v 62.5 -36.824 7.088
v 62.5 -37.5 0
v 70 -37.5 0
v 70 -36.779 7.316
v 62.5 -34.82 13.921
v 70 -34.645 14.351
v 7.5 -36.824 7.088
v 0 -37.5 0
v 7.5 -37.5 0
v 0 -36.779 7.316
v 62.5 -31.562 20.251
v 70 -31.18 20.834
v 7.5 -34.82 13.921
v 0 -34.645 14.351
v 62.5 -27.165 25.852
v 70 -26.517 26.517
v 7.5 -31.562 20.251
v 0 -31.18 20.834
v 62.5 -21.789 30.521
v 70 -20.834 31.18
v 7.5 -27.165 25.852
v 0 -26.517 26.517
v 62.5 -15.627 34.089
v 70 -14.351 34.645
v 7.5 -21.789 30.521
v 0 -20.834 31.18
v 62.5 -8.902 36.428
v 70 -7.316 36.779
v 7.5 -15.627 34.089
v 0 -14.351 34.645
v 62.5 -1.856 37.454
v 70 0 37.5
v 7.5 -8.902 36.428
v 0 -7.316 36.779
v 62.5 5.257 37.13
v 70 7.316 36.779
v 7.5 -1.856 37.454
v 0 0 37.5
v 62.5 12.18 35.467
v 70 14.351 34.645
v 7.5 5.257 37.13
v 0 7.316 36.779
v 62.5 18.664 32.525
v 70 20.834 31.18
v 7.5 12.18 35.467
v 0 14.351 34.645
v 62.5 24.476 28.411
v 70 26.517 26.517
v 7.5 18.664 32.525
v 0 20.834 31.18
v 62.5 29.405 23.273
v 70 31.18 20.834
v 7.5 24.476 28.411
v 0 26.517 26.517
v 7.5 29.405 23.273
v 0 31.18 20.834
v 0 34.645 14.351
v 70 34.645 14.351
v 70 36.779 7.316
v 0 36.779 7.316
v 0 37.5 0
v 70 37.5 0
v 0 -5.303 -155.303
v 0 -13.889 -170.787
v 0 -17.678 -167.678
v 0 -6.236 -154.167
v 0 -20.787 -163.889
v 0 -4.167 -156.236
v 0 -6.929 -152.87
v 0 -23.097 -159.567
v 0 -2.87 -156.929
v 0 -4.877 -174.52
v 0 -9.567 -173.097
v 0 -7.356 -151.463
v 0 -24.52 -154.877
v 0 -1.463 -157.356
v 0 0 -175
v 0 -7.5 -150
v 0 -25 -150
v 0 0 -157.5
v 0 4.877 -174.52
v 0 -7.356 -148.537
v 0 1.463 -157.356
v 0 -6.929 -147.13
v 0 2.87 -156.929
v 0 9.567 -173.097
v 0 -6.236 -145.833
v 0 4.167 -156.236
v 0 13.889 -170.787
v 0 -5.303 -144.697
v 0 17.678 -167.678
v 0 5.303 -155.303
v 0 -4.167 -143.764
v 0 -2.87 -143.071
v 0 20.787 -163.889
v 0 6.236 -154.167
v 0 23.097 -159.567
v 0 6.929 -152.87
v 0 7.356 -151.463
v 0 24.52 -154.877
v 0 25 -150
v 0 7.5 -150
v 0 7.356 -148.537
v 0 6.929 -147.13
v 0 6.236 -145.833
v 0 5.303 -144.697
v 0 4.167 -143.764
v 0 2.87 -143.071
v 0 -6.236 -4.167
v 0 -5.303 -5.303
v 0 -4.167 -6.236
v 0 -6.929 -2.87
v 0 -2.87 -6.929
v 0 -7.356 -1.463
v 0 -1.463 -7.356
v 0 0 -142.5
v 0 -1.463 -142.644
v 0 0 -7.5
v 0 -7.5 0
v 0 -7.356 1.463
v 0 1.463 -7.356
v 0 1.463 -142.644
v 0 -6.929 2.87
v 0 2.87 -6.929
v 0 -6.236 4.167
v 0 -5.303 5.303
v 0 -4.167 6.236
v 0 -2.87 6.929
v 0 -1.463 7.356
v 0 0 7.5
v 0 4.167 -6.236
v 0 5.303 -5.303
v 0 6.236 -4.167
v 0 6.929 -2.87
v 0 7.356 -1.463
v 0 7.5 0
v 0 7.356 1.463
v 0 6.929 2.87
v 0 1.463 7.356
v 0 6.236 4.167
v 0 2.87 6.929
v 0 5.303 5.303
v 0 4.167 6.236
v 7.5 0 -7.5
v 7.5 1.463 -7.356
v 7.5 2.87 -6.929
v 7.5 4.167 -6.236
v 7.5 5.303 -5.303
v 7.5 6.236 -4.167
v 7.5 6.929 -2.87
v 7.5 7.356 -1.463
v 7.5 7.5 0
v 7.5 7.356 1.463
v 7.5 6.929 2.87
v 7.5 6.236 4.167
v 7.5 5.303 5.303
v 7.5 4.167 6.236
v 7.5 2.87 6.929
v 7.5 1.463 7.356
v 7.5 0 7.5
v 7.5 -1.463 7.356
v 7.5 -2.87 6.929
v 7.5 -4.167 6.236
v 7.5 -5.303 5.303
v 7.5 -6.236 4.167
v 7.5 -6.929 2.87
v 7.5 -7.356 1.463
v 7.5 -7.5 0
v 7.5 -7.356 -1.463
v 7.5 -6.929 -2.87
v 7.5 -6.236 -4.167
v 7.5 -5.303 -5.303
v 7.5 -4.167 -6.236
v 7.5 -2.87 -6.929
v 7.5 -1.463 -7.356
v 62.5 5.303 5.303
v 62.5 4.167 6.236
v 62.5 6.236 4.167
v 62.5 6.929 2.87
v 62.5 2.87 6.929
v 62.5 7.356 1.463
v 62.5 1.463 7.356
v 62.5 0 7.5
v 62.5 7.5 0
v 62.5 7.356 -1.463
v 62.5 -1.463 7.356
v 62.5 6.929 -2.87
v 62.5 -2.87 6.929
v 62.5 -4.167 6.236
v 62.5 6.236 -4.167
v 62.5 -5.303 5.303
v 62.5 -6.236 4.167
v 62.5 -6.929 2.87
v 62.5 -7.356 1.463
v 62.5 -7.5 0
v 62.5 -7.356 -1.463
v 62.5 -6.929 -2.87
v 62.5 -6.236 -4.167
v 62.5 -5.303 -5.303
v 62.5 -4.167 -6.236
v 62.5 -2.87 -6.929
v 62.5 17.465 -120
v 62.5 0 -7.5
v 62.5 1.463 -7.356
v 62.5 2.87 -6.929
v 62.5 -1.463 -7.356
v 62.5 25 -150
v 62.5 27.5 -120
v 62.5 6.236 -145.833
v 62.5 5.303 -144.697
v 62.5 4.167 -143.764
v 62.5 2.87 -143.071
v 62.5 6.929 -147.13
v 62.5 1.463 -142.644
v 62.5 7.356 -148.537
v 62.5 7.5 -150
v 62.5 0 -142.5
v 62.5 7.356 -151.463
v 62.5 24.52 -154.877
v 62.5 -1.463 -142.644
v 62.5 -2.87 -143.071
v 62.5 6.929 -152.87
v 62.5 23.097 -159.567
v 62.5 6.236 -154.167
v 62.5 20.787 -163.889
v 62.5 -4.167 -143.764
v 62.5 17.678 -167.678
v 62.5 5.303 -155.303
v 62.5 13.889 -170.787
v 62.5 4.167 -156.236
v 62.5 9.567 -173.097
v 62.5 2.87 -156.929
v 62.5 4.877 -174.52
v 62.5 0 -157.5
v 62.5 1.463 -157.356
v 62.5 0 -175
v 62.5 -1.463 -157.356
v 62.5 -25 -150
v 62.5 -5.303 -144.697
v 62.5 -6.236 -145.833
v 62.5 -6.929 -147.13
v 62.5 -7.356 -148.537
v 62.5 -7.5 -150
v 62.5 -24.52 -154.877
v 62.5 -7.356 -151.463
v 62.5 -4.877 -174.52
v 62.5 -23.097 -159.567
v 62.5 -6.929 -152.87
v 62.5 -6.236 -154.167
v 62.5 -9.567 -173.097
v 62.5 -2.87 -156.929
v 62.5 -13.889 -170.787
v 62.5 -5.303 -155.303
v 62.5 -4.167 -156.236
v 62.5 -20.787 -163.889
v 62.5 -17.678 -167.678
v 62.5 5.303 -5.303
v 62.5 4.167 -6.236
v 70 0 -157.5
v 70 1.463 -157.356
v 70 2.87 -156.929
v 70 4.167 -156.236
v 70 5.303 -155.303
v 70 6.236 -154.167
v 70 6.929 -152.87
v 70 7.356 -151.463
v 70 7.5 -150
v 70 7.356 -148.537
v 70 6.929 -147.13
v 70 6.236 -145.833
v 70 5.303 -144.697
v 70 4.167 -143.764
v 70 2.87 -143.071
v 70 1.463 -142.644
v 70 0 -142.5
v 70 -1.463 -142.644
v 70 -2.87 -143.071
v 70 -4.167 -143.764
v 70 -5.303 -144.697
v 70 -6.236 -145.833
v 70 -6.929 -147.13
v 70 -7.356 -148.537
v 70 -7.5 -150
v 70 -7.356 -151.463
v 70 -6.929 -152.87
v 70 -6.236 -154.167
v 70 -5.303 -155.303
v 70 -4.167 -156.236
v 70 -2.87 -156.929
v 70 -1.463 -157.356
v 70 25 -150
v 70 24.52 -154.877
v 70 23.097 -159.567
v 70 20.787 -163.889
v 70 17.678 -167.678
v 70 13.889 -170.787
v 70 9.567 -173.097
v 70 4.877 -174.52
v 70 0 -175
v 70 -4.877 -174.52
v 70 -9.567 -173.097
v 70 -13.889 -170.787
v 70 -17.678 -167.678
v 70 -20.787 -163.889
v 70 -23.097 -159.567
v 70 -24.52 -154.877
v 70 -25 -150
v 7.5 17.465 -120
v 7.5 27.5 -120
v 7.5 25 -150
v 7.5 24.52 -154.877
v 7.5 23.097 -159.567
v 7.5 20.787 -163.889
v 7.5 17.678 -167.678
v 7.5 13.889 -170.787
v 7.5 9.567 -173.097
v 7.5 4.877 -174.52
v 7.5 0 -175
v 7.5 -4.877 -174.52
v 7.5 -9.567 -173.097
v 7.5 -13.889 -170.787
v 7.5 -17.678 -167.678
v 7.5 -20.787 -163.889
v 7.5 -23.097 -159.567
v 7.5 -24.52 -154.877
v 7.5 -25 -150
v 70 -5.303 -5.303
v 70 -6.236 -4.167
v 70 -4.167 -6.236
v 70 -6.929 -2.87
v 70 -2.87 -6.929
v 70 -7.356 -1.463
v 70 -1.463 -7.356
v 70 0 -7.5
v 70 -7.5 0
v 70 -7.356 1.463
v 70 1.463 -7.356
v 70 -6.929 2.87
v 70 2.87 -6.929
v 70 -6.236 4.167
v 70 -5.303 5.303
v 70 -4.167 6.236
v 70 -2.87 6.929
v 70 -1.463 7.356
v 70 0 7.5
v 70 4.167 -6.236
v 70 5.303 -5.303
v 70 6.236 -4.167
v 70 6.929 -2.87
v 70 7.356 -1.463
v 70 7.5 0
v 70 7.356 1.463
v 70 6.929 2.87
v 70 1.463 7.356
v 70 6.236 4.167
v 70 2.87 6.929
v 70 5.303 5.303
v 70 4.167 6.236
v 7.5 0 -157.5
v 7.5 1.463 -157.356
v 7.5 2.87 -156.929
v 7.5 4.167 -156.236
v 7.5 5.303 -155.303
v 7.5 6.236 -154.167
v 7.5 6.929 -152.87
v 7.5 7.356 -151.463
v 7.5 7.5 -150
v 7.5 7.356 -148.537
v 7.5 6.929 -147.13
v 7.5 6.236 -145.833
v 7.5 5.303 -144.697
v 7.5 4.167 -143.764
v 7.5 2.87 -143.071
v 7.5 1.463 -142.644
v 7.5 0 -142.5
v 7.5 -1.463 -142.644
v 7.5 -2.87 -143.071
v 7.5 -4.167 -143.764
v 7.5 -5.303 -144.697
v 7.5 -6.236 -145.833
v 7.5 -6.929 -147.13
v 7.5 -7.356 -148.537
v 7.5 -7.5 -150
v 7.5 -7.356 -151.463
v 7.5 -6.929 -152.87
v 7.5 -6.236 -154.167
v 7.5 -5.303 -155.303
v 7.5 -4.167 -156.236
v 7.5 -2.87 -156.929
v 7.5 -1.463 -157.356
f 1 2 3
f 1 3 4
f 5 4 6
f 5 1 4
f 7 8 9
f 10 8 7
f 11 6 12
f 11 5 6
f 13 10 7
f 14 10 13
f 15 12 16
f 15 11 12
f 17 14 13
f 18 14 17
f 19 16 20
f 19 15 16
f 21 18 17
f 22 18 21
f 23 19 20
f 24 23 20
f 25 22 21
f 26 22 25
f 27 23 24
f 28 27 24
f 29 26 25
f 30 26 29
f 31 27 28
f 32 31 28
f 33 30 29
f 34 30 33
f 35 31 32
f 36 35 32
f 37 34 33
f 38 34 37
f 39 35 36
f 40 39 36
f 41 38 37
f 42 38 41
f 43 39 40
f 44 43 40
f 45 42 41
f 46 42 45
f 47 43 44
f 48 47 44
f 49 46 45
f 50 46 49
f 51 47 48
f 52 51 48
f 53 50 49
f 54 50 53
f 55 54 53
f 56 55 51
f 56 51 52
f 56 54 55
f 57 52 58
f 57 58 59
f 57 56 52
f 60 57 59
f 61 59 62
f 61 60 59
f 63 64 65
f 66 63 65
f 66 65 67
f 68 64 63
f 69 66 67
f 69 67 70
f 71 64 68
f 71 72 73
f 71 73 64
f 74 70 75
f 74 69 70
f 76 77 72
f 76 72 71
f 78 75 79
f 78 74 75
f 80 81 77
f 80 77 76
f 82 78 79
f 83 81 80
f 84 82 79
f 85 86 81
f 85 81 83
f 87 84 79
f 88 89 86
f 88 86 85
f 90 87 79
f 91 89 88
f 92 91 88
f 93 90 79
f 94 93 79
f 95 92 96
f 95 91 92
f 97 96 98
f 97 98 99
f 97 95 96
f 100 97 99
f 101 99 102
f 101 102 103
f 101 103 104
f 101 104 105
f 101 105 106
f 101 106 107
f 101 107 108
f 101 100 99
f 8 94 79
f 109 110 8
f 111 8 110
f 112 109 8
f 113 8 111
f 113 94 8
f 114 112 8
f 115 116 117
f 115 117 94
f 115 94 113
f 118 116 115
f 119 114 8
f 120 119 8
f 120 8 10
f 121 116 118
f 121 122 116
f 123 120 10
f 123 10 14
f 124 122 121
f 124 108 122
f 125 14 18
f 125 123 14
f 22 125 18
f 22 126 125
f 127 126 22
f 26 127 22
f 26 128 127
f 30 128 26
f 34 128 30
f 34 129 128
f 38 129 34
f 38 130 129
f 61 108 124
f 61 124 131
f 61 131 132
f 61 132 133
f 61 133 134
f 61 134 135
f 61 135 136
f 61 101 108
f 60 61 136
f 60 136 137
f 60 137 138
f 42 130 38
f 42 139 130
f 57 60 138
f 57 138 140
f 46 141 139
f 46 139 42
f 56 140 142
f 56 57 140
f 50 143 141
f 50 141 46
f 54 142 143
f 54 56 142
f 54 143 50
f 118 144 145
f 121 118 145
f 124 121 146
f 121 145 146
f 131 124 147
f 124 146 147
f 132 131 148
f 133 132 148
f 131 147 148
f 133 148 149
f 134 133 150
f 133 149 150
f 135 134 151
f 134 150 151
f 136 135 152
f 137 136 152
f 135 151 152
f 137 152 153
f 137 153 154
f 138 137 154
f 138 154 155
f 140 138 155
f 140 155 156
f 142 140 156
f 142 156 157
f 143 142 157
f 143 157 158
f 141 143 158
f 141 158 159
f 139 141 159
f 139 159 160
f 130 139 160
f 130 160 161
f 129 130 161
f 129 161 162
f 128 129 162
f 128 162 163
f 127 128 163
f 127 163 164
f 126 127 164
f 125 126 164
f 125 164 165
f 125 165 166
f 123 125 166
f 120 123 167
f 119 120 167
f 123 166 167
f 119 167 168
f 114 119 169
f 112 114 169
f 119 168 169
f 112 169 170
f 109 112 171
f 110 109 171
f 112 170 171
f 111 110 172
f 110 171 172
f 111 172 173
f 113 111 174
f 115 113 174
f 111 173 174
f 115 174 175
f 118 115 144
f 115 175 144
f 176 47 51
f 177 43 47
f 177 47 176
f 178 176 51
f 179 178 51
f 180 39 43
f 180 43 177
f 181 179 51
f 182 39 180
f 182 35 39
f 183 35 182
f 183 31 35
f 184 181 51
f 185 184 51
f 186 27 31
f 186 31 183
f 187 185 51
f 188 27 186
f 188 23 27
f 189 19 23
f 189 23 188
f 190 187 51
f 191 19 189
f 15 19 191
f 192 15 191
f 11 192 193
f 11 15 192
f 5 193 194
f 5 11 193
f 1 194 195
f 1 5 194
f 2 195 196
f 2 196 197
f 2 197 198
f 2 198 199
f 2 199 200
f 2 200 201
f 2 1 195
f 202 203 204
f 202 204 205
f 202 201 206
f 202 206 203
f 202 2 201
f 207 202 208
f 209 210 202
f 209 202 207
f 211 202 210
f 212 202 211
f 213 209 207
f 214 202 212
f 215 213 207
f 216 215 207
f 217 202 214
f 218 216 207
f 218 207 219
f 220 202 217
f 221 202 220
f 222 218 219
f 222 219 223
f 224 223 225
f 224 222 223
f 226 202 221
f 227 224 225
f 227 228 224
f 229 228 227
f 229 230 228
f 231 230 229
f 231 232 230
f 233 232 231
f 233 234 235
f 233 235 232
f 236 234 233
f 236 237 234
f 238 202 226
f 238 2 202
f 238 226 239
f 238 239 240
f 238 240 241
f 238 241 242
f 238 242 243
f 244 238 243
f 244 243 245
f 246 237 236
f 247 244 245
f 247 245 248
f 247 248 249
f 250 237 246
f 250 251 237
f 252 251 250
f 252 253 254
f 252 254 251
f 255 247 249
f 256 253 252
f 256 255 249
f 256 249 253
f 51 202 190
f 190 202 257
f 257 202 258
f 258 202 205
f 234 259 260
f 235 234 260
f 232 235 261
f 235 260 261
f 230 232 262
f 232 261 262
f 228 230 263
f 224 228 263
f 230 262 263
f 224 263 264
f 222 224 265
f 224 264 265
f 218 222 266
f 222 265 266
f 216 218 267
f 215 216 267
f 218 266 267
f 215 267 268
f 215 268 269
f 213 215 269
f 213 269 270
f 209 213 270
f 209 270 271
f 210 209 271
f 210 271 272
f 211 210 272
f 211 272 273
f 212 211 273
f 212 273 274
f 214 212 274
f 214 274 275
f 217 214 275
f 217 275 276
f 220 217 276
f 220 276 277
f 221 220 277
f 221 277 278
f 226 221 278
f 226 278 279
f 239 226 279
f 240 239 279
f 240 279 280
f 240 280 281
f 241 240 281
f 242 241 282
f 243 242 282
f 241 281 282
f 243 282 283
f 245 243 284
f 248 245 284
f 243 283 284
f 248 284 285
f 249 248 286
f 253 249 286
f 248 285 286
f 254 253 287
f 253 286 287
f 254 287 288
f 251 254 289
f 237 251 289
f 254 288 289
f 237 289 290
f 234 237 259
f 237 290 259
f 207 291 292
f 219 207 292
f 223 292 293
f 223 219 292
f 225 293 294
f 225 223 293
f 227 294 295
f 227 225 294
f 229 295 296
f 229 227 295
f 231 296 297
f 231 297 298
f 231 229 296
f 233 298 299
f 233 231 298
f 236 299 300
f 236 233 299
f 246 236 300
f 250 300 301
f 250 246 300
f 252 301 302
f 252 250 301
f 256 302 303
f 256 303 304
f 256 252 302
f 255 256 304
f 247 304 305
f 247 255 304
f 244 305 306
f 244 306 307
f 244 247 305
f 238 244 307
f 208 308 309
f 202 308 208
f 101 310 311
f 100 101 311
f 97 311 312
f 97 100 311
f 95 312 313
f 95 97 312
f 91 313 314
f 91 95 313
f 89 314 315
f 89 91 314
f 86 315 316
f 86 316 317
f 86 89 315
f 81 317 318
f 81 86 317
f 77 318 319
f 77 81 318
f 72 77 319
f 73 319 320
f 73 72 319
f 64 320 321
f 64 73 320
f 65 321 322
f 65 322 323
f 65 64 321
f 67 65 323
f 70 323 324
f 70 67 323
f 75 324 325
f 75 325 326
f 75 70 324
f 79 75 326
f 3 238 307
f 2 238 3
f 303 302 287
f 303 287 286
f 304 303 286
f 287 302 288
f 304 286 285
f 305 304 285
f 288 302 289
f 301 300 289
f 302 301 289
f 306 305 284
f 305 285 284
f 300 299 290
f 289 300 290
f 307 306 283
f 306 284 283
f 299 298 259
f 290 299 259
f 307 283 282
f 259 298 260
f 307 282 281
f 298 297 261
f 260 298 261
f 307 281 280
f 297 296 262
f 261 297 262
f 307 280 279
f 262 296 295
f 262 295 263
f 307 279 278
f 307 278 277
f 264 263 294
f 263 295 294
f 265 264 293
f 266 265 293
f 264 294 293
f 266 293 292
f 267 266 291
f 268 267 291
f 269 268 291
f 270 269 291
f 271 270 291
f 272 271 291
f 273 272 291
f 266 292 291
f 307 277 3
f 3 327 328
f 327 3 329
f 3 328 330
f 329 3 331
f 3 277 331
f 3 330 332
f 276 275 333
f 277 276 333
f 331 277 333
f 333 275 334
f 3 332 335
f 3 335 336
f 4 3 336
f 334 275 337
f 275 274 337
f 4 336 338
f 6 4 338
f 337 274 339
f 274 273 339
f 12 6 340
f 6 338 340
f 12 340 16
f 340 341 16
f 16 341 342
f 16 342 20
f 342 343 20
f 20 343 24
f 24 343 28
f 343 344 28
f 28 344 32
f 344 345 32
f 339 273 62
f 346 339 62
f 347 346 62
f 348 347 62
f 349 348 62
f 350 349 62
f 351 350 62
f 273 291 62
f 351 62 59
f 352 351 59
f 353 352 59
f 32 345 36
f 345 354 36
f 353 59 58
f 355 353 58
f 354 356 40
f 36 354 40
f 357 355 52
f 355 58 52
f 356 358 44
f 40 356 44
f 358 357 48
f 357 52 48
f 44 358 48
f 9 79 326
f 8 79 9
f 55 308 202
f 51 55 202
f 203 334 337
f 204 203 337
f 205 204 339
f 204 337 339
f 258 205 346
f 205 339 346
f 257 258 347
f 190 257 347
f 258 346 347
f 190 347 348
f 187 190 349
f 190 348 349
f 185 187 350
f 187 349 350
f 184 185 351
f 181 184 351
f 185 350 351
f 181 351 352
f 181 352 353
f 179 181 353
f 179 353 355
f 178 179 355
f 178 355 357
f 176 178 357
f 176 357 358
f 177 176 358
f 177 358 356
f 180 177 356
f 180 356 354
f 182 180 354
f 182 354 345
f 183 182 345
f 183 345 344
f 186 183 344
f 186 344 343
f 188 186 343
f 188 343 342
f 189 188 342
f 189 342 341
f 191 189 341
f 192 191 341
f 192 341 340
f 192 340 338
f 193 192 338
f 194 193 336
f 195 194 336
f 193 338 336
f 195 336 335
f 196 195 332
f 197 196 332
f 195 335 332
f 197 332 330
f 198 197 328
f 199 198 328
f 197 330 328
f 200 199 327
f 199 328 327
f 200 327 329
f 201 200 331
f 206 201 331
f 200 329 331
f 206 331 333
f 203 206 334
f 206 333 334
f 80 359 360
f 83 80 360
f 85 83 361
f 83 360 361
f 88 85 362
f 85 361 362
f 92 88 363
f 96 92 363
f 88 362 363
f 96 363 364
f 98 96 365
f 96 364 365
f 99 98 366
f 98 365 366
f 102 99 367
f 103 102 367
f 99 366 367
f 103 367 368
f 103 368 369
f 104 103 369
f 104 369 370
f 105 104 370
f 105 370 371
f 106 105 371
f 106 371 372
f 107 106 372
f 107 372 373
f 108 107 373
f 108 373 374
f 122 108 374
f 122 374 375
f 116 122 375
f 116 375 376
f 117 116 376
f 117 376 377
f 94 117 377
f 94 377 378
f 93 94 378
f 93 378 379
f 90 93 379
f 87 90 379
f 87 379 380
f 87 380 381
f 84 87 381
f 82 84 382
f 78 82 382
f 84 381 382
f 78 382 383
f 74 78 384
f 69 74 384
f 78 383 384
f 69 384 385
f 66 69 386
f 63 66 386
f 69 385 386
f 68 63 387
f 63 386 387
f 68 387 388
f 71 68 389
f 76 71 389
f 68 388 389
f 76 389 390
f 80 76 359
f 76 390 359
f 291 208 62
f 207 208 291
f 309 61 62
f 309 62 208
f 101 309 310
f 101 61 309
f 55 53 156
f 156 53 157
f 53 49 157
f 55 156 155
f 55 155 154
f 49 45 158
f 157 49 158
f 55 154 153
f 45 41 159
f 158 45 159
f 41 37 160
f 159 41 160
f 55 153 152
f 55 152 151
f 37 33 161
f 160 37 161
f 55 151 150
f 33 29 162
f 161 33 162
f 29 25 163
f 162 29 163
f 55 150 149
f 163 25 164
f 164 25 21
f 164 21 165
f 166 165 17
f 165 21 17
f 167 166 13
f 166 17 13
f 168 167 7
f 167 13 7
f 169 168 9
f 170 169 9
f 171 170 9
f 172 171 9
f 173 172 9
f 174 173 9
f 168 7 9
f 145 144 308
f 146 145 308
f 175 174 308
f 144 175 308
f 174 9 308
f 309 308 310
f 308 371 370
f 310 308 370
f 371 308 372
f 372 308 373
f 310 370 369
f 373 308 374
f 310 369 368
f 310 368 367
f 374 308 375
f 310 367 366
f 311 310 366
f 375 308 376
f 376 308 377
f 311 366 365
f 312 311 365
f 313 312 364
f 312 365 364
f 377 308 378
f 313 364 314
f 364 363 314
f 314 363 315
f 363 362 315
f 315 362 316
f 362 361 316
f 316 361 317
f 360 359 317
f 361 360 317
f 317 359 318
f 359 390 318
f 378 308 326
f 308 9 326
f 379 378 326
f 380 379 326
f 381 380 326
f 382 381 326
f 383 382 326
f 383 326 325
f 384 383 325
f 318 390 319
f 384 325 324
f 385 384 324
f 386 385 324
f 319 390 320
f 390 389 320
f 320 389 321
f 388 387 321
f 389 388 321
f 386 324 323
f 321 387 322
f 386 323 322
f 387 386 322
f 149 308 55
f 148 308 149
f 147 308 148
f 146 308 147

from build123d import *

# Parameters (mm, degrees)
BOSS_EXTRUDE1_DEPTH     = 70
CUT_EXTRUDE1_DEPTH      = 193.17505041
CUT_EXTRUDE1_DEPTH_BACK = 193.17505041
SKETCH2_W               = 55
SKETCH2_H               = 55
CUT_EXTRUDE2_REACH      = 212.087
CUT_EXTRUDE2_START      = -10
SKETCH4_W               = 55
SKETCH4_H               = 159.369241685
SKETCH7_R               = 7.5
CUT_EXTRUDE4_DEPTH      = 193.17505041
SKETCH8_R               = 7.5
CUT_EXTRUDE5_DEPTH      = 193.17505041


with BuildPart() as part:
    # Sketch1 → Boss-Extrude1 (new body)
    with BuildSketch(Plane(origin=(0, 0, 0), x_dir=(0, 0, -1), z_dir=(1, 0, 0))):
        with BuildLine():
            Line((0, 37.5), (150, 25))
            ThreePointArc((150, 25), (175, 0), (150, -25))
            Line((150, -25), (0, -37.5))
            ThreePointArc((0, -37.5), (-37.5, 0), (0, 37.5))
        make_face()
    extrude(amount=BOSS_EXTRUDE1_DEPTH)

    # Sketch2 → Cut-Extrude1 (cut, two sides: drawn at the far end of the back side and taken through both)
    with BuildSketch(Plane(origin=(0, 0, 0), x_dir=(1, 0, 0), z_dir=(0, 1, 0)).offset(-CUT_EXTRUDE1_DEPTH_BACK)):
        with Locations((35, 147.5)):
            Rectangle(SKETCH2_W, SKETCH2_H)
    extrude(amount=CUT_EXTRUDE1_DEPTH + CUT_EXTRUDE1_DEPTH_BACK, mode=Mode.SUBTRACT)

    # Cut-Extrude2: up to this face of the body (flat: up to its plane)
    cut_extrude2_end = Plane(part.part.faces().sort_by_distance((35, -32.18220339, -63.813559322))[0])
    # Sketch4 → Cut-Extrude2 (cut, up to the picked face)
    with BuildSketch(Plane(origin=(0, 37.24137931, -3.103448276), x_dir=(1, 0, 0), z_dir=(0, 0.9965457582448797, -0.08304547985374003)).offset(CUT_EXTRUDE2_START), mode=Mode.PRIVATE) as cut_extrude2_sk1:
        with Locations((35, 42.184620843)):
            Rectangle(SKETCH4_W, SKETCH4_H)
    cut_extrude2_tool1 = split(extrude(cut_extrude2_sk1.sketch, amount=-CUT_EXTRUDE2_REACH, mode=Mode.PRIVATE), bisect_by=cut_extrude2_end, keep=Keep.BOTH, mode=Mode.PRIVATE)
    add(cut_extrude2_tool1.solids().sort_by(Axis((35, 23.77268, -44.311898), (0, -0.9965457582448797, 0.08304547985374003)))[0], mode=Mode.SUBTRACT)

    # Sketch7 → Cut-Extrude4 (cut, through all)
    with BuildSketch(Plane(origin=(70, 0, 0), x_dir=(0, 0, -1), z_dir=(1, 0, 0))):
        Circle(SKETCH7_R)
    extrude(amount=-CUT_EXTRUDE4_DEPTH, mode=Mode.SUBTRACT)

    # Sketch8 → Cut-Extrude5 (cut, through all)
    with BuildSketch(Plane(origin=(70, 0, 0), x_dir=(0, 0, -1), z_dir=(1, 0, 0))):
        with Locations((150, 0)):
            Circle(SKETCH8_R)
    extrude(amount=-CUT_EXTRUDE5_DEPTH, mode=Mode.SUBTRACT)


solid = part.part
